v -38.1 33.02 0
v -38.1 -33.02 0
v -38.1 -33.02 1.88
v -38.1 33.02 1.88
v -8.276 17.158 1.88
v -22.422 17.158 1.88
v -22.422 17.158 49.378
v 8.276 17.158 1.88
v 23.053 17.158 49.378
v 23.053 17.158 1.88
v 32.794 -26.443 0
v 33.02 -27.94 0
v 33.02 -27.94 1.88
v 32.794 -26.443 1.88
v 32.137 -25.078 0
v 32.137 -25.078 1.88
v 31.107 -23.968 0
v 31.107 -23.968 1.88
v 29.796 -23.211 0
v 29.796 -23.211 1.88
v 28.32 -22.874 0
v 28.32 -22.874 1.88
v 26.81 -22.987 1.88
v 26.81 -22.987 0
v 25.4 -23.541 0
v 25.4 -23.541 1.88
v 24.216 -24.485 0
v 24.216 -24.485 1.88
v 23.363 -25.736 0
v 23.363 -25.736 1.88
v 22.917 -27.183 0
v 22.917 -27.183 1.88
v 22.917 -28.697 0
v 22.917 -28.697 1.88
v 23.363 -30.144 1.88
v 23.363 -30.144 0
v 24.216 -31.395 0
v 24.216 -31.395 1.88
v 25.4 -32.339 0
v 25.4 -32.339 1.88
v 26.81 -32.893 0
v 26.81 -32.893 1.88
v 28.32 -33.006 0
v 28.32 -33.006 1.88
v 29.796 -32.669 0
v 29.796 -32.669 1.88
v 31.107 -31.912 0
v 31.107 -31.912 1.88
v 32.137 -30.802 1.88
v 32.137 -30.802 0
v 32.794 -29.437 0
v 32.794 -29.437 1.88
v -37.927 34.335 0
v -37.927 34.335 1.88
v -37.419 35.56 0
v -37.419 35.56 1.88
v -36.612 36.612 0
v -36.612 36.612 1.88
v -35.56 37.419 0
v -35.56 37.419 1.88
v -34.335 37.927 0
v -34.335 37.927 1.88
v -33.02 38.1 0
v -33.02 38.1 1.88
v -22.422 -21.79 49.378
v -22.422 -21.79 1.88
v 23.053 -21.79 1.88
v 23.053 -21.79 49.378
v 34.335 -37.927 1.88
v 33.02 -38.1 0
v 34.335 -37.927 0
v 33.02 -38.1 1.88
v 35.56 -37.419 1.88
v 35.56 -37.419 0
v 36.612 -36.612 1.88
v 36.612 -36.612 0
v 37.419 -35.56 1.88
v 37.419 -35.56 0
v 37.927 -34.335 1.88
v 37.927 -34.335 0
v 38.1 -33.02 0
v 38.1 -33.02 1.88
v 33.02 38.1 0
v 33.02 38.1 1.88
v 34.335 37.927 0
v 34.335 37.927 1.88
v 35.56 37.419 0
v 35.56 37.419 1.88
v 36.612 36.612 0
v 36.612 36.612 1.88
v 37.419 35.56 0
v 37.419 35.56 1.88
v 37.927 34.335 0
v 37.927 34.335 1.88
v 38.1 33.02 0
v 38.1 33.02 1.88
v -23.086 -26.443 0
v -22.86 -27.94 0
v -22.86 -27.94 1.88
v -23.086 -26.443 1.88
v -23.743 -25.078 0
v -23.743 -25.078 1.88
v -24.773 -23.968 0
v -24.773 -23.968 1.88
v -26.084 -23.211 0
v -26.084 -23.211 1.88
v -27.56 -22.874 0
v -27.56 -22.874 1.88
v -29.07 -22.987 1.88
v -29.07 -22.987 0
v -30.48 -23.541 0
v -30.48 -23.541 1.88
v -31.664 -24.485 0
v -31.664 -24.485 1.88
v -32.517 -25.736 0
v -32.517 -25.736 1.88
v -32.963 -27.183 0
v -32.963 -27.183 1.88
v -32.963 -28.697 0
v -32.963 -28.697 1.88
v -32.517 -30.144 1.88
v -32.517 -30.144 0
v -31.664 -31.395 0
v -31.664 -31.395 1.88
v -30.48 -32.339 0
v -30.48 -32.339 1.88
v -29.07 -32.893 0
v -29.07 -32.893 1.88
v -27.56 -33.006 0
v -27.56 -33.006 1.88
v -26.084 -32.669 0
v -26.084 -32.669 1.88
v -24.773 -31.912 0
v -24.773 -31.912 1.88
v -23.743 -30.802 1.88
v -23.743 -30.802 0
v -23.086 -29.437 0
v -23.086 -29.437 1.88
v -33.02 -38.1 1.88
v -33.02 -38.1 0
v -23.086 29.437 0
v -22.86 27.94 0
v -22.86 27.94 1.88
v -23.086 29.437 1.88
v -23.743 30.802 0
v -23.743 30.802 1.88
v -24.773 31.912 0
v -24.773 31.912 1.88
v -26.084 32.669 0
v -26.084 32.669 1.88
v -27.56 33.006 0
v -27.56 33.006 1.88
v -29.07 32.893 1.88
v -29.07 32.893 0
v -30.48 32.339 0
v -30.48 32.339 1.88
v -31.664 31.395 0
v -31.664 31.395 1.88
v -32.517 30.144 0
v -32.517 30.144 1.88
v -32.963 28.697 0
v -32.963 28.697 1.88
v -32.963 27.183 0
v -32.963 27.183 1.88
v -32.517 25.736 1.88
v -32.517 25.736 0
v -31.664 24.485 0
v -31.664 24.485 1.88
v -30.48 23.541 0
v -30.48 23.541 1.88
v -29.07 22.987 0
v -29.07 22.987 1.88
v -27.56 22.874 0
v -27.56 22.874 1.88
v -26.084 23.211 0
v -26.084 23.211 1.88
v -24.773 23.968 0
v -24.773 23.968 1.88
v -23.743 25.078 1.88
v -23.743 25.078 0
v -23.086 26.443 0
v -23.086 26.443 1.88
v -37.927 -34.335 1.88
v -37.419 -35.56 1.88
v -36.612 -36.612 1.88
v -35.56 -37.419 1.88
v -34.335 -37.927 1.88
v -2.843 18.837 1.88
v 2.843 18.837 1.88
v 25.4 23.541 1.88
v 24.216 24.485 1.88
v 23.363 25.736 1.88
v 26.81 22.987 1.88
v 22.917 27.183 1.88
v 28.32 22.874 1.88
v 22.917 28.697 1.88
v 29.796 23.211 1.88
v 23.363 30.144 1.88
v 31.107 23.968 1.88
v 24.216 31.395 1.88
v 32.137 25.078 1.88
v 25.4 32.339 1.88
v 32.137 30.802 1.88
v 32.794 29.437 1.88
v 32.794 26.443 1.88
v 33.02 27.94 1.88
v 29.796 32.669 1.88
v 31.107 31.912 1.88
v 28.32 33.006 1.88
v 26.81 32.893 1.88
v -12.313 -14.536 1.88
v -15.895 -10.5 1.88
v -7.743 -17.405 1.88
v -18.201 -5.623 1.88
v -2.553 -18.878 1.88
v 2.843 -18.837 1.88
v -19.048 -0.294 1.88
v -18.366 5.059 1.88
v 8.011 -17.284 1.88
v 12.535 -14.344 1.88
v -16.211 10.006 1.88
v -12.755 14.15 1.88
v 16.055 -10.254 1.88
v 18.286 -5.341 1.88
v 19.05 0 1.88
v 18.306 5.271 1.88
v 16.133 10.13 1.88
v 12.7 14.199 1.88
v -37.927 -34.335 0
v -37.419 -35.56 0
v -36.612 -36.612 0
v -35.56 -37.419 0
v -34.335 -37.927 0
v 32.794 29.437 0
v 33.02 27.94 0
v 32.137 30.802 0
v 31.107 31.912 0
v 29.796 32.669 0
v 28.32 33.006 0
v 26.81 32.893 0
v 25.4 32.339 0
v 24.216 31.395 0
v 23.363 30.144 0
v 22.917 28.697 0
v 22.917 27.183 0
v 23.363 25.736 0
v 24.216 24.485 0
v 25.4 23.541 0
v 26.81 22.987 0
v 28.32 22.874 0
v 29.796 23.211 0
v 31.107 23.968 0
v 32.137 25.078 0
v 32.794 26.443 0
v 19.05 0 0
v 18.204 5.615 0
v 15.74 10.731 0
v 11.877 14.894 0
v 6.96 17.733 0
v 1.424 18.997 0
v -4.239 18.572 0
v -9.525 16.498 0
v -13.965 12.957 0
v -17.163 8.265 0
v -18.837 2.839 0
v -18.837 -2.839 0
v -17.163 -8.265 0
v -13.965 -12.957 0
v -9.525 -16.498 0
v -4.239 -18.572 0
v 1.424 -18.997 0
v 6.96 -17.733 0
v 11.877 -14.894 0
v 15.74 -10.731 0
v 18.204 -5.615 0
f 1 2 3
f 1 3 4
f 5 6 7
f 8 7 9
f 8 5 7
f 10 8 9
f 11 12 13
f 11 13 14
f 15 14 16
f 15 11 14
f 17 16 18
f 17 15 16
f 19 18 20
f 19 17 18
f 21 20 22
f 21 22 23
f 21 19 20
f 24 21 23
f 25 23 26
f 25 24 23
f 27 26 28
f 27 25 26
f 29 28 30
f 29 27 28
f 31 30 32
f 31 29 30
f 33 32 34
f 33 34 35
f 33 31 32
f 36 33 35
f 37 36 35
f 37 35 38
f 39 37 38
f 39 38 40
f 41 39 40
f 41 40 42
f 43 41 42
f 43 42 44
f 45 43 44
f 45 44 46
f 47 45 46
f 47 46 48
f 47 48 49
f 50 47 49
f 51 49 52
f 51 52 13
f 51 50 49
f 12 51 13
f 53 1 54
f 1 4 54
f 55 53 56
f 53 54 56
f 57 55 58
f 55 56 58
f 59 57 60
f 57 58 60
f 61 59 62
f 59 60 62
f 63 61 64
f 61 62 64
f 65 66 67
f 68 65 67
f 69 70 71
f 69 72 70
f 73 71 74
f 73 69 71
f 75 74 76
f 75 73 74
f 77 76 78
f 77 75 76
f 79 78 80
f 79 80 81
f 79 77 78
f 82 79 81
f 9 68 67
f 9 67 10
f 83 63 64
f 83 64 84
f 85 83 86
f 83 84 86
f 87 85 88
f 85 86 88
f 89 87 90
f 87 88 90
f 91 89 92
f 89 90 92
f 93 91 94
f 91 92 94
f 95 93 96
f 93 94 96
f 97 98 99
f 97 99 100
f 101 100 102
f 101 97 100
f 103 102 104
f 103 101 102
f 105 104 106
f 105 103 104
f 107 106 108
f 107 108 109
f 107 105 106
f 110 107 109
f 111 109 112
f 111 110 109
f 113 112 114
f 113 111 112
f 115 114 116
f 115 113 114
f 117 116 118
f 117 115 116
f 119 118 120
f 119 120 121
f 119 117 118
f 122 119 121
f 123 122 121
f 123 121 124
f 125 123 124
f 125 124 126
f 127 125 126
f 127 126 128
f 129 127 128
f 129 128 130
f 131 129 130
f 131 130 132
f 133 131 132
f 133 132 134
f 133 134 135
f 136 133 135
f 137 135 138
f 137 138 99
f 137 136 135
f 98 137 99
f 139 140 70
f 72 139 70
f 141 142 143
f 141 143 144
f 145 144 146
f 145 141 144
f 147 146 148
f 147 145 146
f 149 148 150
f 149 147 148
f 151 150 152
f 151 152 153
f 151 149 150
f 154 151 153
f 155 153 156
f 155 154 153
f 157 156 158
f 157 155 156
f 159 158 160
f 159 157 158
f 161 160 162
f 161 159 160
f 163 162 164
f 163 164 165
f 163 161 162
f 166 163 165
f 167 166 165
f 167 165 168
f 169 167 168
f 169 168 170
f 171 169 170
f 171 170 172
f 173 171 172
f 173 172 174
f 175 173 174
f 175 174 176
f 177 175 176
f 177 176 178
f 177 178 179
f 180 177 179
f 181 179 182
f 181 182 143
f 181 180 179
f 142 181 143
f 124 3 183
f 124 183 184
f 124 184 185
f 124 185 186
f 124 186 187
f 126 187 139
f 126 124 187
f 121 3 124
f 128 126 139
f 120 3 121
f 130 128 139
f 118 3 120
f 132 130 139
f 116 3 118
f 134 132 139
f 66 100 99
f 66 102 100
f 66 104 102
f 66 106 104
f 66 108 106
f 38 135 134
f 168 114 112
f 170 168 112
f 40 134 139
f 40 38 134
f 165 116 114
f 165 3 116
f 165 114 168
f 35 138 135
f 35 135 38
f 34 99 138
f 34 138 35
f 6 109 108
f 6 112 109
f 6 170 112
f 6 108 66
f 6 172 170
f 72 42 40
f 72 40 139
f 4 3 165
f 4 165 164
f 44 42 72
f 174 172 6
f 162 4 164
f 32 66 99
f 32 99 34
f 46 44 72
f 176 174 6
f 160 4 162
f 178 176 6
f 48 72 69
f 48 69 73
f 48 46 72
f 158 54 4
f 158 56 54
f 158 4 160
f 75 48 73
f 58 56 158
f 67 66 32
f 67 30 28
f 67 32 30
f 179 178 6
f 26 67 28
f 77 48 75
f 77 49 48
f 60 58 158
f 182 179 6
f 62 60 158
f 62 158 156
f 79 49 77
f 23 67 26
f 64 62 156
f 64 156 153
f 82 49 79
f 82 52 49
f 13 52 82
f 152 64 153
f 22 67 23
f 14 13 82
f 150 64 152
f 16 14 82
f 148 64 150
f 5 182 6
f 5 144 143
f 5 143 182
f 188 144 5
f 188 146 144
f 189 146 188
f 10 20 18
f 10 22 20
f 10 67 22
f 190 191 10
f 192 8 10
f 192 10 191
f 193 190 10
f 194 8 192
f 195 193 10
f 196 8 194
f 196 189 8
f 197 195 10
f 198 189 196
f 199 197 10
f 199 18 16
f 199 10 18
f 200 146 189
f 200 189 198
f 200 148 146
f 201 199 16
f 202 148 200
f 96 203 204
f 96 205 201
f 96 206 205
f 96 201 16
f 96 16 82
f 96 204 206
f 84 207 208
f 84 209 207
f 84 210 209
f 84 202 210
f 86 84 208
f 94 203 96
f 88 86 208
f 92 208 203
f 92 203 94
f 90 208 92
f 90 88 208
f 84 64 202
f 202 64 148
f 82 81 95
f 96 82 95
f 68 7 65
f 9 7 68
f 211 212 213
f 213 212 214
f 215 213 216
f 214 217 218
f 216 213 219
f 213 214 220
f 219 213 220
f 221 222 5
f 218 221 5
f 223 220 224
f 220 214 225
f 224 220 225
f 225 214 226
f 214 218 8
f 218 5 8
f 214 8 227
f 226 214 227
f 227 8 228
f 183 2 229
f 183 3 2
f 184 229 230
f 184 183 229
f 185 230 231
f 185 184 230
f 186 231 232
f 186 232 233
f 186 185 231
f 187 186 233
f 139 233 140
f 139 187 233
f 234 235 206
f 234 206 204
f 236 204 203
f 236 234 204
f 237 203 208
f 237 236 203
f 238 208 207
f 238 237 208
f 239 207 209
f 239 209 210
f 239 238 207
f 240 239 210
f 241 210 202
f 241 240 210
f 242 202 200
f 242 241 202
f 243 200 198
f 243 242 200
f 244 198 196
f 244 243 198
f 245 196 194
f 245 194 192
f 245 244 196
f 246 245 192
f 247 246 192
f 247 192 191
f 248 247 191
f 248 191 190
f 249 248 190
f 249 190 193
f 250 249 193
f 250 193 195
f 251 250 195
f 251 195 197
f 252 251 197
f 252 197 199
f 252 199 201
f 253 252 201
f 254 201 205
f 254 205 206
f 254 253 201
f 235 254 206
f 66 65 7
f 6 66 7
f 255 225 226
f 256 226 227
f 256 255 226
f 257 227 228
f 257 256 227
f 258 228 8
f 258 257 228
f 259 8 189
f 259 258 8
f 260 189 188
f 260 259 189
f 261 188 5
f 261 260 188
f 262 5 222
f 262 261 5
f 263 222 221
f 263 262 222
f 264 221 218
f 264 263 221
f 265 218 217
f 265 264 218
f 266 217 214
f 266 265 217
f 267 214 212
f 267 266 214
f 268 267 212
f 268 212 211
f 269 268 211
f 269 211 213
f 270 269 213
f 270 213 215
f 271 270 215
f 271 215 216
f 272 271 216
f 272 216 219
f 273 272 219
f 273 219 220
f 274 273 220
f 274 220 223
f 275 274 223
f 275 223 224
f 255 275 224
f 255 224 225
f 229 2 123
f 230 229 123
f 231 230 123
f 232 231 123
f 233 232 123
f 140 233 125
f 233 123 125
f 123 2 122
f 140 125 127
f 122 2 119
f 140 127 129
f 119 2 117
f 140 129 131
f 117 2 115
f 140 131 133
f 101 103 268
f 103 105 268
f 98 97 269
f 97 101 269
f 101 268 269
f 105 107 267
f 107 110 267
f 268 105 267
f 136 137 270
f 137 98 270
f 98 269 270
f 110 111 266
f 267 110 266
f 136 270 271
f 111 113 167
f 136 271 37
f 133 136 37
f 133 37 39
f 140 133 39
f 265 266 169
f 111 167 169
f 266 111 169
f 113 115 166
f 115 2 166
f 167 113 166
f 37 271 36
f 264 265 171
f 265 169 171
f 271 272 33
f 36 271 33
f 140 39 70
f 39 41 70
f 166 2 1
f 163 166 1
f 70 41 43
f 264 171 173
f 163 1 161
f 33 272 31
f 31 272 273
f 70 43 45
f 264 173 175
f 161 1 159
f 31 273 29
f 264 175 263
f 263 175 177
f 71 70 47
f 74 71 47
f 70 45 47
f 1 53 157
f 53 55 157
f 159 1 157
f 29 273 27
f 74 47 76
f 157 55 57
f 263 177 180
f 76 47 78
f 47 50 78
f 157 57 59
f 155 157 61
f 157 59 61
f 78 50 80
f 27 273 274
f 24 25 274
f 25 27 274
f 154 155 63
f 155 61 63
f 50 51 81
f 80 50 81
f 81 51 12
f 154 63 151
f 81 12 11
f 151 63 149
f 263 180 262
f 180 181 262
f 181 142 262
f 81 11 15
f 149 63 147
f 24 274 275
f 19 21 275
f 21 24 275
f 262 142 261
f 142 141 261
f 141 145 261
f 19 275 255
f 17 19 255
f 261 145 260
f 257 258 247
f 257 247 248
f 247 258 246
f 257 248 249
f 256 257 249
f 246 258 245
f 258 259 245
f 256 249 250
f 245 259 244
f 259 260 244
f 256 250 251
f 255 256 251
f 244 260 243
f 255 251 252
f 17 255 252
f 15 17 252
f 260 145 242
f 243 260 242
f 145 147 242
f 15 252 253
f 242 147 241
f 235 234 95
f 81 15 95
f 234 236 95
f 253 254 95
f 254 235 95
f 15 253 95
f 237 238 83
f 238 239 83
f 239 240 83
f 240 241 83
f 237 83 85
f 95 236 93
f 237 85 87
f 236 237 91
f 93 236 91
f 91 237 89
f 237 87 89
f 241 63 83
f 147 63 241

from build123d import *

# Parameters (mm, degrees)
F0_W     = 76.2
F0_H     = 76.2
F0_R     = 5.08
F0_R_2   = 19.05
F1_DEPTH = 1.8796
F2_R     = 5.08
F5_W     = 45.474999
F5_H     = 38.948495
F6_DEPTH = 47.498


with BuildPart() as f1:
    # F0 (on Top) → F1 (new body)
    with BuildSketch(Plane.XY):
        Rectangle(F0_W, F0_H)
        with Locations((-27.94, -27.94)):
            Circle(F0_R, mode=Mode.SUBTRACT)
        with Locations((27.94, -27.94)):
            Circle(F0_R, mode=Mode.SUBTRACT)
        with Locations((-27.94, 27.94)):
            Circle(F0_R, mode=Mode.SUBTRACT)
        Circle(F0_R_2, mode=Mode.SUBTRACT)
        with Locations((27.94, 27.94)):
            Circle(F0_R, mode=Mode.SUBTRACT)
    extrude(amount=F1_DEPTH)

    # F2
    f2_edges = [f1.edges().sort_by_distance(p)[0] for p in [
        (-38.1, -38.1, 0.9398),
        (38.1, -38.1, 0.9398),
        (38.1, 38.1, 0.9398),
        (-38.1, 38.1, 0.9398),
    ]]
    fillet(f2_edges, radius=F2_R)

    # F5 (on face) → F6 (join)
    with BuildSketch(Plane.XY.offset(1.8796)):
        with Locations((0.315798, -2.315857)):
            Rectangle(F5_W, F5_H)
    extrude(amount=F6_DEPTH)


solid = f1.part
